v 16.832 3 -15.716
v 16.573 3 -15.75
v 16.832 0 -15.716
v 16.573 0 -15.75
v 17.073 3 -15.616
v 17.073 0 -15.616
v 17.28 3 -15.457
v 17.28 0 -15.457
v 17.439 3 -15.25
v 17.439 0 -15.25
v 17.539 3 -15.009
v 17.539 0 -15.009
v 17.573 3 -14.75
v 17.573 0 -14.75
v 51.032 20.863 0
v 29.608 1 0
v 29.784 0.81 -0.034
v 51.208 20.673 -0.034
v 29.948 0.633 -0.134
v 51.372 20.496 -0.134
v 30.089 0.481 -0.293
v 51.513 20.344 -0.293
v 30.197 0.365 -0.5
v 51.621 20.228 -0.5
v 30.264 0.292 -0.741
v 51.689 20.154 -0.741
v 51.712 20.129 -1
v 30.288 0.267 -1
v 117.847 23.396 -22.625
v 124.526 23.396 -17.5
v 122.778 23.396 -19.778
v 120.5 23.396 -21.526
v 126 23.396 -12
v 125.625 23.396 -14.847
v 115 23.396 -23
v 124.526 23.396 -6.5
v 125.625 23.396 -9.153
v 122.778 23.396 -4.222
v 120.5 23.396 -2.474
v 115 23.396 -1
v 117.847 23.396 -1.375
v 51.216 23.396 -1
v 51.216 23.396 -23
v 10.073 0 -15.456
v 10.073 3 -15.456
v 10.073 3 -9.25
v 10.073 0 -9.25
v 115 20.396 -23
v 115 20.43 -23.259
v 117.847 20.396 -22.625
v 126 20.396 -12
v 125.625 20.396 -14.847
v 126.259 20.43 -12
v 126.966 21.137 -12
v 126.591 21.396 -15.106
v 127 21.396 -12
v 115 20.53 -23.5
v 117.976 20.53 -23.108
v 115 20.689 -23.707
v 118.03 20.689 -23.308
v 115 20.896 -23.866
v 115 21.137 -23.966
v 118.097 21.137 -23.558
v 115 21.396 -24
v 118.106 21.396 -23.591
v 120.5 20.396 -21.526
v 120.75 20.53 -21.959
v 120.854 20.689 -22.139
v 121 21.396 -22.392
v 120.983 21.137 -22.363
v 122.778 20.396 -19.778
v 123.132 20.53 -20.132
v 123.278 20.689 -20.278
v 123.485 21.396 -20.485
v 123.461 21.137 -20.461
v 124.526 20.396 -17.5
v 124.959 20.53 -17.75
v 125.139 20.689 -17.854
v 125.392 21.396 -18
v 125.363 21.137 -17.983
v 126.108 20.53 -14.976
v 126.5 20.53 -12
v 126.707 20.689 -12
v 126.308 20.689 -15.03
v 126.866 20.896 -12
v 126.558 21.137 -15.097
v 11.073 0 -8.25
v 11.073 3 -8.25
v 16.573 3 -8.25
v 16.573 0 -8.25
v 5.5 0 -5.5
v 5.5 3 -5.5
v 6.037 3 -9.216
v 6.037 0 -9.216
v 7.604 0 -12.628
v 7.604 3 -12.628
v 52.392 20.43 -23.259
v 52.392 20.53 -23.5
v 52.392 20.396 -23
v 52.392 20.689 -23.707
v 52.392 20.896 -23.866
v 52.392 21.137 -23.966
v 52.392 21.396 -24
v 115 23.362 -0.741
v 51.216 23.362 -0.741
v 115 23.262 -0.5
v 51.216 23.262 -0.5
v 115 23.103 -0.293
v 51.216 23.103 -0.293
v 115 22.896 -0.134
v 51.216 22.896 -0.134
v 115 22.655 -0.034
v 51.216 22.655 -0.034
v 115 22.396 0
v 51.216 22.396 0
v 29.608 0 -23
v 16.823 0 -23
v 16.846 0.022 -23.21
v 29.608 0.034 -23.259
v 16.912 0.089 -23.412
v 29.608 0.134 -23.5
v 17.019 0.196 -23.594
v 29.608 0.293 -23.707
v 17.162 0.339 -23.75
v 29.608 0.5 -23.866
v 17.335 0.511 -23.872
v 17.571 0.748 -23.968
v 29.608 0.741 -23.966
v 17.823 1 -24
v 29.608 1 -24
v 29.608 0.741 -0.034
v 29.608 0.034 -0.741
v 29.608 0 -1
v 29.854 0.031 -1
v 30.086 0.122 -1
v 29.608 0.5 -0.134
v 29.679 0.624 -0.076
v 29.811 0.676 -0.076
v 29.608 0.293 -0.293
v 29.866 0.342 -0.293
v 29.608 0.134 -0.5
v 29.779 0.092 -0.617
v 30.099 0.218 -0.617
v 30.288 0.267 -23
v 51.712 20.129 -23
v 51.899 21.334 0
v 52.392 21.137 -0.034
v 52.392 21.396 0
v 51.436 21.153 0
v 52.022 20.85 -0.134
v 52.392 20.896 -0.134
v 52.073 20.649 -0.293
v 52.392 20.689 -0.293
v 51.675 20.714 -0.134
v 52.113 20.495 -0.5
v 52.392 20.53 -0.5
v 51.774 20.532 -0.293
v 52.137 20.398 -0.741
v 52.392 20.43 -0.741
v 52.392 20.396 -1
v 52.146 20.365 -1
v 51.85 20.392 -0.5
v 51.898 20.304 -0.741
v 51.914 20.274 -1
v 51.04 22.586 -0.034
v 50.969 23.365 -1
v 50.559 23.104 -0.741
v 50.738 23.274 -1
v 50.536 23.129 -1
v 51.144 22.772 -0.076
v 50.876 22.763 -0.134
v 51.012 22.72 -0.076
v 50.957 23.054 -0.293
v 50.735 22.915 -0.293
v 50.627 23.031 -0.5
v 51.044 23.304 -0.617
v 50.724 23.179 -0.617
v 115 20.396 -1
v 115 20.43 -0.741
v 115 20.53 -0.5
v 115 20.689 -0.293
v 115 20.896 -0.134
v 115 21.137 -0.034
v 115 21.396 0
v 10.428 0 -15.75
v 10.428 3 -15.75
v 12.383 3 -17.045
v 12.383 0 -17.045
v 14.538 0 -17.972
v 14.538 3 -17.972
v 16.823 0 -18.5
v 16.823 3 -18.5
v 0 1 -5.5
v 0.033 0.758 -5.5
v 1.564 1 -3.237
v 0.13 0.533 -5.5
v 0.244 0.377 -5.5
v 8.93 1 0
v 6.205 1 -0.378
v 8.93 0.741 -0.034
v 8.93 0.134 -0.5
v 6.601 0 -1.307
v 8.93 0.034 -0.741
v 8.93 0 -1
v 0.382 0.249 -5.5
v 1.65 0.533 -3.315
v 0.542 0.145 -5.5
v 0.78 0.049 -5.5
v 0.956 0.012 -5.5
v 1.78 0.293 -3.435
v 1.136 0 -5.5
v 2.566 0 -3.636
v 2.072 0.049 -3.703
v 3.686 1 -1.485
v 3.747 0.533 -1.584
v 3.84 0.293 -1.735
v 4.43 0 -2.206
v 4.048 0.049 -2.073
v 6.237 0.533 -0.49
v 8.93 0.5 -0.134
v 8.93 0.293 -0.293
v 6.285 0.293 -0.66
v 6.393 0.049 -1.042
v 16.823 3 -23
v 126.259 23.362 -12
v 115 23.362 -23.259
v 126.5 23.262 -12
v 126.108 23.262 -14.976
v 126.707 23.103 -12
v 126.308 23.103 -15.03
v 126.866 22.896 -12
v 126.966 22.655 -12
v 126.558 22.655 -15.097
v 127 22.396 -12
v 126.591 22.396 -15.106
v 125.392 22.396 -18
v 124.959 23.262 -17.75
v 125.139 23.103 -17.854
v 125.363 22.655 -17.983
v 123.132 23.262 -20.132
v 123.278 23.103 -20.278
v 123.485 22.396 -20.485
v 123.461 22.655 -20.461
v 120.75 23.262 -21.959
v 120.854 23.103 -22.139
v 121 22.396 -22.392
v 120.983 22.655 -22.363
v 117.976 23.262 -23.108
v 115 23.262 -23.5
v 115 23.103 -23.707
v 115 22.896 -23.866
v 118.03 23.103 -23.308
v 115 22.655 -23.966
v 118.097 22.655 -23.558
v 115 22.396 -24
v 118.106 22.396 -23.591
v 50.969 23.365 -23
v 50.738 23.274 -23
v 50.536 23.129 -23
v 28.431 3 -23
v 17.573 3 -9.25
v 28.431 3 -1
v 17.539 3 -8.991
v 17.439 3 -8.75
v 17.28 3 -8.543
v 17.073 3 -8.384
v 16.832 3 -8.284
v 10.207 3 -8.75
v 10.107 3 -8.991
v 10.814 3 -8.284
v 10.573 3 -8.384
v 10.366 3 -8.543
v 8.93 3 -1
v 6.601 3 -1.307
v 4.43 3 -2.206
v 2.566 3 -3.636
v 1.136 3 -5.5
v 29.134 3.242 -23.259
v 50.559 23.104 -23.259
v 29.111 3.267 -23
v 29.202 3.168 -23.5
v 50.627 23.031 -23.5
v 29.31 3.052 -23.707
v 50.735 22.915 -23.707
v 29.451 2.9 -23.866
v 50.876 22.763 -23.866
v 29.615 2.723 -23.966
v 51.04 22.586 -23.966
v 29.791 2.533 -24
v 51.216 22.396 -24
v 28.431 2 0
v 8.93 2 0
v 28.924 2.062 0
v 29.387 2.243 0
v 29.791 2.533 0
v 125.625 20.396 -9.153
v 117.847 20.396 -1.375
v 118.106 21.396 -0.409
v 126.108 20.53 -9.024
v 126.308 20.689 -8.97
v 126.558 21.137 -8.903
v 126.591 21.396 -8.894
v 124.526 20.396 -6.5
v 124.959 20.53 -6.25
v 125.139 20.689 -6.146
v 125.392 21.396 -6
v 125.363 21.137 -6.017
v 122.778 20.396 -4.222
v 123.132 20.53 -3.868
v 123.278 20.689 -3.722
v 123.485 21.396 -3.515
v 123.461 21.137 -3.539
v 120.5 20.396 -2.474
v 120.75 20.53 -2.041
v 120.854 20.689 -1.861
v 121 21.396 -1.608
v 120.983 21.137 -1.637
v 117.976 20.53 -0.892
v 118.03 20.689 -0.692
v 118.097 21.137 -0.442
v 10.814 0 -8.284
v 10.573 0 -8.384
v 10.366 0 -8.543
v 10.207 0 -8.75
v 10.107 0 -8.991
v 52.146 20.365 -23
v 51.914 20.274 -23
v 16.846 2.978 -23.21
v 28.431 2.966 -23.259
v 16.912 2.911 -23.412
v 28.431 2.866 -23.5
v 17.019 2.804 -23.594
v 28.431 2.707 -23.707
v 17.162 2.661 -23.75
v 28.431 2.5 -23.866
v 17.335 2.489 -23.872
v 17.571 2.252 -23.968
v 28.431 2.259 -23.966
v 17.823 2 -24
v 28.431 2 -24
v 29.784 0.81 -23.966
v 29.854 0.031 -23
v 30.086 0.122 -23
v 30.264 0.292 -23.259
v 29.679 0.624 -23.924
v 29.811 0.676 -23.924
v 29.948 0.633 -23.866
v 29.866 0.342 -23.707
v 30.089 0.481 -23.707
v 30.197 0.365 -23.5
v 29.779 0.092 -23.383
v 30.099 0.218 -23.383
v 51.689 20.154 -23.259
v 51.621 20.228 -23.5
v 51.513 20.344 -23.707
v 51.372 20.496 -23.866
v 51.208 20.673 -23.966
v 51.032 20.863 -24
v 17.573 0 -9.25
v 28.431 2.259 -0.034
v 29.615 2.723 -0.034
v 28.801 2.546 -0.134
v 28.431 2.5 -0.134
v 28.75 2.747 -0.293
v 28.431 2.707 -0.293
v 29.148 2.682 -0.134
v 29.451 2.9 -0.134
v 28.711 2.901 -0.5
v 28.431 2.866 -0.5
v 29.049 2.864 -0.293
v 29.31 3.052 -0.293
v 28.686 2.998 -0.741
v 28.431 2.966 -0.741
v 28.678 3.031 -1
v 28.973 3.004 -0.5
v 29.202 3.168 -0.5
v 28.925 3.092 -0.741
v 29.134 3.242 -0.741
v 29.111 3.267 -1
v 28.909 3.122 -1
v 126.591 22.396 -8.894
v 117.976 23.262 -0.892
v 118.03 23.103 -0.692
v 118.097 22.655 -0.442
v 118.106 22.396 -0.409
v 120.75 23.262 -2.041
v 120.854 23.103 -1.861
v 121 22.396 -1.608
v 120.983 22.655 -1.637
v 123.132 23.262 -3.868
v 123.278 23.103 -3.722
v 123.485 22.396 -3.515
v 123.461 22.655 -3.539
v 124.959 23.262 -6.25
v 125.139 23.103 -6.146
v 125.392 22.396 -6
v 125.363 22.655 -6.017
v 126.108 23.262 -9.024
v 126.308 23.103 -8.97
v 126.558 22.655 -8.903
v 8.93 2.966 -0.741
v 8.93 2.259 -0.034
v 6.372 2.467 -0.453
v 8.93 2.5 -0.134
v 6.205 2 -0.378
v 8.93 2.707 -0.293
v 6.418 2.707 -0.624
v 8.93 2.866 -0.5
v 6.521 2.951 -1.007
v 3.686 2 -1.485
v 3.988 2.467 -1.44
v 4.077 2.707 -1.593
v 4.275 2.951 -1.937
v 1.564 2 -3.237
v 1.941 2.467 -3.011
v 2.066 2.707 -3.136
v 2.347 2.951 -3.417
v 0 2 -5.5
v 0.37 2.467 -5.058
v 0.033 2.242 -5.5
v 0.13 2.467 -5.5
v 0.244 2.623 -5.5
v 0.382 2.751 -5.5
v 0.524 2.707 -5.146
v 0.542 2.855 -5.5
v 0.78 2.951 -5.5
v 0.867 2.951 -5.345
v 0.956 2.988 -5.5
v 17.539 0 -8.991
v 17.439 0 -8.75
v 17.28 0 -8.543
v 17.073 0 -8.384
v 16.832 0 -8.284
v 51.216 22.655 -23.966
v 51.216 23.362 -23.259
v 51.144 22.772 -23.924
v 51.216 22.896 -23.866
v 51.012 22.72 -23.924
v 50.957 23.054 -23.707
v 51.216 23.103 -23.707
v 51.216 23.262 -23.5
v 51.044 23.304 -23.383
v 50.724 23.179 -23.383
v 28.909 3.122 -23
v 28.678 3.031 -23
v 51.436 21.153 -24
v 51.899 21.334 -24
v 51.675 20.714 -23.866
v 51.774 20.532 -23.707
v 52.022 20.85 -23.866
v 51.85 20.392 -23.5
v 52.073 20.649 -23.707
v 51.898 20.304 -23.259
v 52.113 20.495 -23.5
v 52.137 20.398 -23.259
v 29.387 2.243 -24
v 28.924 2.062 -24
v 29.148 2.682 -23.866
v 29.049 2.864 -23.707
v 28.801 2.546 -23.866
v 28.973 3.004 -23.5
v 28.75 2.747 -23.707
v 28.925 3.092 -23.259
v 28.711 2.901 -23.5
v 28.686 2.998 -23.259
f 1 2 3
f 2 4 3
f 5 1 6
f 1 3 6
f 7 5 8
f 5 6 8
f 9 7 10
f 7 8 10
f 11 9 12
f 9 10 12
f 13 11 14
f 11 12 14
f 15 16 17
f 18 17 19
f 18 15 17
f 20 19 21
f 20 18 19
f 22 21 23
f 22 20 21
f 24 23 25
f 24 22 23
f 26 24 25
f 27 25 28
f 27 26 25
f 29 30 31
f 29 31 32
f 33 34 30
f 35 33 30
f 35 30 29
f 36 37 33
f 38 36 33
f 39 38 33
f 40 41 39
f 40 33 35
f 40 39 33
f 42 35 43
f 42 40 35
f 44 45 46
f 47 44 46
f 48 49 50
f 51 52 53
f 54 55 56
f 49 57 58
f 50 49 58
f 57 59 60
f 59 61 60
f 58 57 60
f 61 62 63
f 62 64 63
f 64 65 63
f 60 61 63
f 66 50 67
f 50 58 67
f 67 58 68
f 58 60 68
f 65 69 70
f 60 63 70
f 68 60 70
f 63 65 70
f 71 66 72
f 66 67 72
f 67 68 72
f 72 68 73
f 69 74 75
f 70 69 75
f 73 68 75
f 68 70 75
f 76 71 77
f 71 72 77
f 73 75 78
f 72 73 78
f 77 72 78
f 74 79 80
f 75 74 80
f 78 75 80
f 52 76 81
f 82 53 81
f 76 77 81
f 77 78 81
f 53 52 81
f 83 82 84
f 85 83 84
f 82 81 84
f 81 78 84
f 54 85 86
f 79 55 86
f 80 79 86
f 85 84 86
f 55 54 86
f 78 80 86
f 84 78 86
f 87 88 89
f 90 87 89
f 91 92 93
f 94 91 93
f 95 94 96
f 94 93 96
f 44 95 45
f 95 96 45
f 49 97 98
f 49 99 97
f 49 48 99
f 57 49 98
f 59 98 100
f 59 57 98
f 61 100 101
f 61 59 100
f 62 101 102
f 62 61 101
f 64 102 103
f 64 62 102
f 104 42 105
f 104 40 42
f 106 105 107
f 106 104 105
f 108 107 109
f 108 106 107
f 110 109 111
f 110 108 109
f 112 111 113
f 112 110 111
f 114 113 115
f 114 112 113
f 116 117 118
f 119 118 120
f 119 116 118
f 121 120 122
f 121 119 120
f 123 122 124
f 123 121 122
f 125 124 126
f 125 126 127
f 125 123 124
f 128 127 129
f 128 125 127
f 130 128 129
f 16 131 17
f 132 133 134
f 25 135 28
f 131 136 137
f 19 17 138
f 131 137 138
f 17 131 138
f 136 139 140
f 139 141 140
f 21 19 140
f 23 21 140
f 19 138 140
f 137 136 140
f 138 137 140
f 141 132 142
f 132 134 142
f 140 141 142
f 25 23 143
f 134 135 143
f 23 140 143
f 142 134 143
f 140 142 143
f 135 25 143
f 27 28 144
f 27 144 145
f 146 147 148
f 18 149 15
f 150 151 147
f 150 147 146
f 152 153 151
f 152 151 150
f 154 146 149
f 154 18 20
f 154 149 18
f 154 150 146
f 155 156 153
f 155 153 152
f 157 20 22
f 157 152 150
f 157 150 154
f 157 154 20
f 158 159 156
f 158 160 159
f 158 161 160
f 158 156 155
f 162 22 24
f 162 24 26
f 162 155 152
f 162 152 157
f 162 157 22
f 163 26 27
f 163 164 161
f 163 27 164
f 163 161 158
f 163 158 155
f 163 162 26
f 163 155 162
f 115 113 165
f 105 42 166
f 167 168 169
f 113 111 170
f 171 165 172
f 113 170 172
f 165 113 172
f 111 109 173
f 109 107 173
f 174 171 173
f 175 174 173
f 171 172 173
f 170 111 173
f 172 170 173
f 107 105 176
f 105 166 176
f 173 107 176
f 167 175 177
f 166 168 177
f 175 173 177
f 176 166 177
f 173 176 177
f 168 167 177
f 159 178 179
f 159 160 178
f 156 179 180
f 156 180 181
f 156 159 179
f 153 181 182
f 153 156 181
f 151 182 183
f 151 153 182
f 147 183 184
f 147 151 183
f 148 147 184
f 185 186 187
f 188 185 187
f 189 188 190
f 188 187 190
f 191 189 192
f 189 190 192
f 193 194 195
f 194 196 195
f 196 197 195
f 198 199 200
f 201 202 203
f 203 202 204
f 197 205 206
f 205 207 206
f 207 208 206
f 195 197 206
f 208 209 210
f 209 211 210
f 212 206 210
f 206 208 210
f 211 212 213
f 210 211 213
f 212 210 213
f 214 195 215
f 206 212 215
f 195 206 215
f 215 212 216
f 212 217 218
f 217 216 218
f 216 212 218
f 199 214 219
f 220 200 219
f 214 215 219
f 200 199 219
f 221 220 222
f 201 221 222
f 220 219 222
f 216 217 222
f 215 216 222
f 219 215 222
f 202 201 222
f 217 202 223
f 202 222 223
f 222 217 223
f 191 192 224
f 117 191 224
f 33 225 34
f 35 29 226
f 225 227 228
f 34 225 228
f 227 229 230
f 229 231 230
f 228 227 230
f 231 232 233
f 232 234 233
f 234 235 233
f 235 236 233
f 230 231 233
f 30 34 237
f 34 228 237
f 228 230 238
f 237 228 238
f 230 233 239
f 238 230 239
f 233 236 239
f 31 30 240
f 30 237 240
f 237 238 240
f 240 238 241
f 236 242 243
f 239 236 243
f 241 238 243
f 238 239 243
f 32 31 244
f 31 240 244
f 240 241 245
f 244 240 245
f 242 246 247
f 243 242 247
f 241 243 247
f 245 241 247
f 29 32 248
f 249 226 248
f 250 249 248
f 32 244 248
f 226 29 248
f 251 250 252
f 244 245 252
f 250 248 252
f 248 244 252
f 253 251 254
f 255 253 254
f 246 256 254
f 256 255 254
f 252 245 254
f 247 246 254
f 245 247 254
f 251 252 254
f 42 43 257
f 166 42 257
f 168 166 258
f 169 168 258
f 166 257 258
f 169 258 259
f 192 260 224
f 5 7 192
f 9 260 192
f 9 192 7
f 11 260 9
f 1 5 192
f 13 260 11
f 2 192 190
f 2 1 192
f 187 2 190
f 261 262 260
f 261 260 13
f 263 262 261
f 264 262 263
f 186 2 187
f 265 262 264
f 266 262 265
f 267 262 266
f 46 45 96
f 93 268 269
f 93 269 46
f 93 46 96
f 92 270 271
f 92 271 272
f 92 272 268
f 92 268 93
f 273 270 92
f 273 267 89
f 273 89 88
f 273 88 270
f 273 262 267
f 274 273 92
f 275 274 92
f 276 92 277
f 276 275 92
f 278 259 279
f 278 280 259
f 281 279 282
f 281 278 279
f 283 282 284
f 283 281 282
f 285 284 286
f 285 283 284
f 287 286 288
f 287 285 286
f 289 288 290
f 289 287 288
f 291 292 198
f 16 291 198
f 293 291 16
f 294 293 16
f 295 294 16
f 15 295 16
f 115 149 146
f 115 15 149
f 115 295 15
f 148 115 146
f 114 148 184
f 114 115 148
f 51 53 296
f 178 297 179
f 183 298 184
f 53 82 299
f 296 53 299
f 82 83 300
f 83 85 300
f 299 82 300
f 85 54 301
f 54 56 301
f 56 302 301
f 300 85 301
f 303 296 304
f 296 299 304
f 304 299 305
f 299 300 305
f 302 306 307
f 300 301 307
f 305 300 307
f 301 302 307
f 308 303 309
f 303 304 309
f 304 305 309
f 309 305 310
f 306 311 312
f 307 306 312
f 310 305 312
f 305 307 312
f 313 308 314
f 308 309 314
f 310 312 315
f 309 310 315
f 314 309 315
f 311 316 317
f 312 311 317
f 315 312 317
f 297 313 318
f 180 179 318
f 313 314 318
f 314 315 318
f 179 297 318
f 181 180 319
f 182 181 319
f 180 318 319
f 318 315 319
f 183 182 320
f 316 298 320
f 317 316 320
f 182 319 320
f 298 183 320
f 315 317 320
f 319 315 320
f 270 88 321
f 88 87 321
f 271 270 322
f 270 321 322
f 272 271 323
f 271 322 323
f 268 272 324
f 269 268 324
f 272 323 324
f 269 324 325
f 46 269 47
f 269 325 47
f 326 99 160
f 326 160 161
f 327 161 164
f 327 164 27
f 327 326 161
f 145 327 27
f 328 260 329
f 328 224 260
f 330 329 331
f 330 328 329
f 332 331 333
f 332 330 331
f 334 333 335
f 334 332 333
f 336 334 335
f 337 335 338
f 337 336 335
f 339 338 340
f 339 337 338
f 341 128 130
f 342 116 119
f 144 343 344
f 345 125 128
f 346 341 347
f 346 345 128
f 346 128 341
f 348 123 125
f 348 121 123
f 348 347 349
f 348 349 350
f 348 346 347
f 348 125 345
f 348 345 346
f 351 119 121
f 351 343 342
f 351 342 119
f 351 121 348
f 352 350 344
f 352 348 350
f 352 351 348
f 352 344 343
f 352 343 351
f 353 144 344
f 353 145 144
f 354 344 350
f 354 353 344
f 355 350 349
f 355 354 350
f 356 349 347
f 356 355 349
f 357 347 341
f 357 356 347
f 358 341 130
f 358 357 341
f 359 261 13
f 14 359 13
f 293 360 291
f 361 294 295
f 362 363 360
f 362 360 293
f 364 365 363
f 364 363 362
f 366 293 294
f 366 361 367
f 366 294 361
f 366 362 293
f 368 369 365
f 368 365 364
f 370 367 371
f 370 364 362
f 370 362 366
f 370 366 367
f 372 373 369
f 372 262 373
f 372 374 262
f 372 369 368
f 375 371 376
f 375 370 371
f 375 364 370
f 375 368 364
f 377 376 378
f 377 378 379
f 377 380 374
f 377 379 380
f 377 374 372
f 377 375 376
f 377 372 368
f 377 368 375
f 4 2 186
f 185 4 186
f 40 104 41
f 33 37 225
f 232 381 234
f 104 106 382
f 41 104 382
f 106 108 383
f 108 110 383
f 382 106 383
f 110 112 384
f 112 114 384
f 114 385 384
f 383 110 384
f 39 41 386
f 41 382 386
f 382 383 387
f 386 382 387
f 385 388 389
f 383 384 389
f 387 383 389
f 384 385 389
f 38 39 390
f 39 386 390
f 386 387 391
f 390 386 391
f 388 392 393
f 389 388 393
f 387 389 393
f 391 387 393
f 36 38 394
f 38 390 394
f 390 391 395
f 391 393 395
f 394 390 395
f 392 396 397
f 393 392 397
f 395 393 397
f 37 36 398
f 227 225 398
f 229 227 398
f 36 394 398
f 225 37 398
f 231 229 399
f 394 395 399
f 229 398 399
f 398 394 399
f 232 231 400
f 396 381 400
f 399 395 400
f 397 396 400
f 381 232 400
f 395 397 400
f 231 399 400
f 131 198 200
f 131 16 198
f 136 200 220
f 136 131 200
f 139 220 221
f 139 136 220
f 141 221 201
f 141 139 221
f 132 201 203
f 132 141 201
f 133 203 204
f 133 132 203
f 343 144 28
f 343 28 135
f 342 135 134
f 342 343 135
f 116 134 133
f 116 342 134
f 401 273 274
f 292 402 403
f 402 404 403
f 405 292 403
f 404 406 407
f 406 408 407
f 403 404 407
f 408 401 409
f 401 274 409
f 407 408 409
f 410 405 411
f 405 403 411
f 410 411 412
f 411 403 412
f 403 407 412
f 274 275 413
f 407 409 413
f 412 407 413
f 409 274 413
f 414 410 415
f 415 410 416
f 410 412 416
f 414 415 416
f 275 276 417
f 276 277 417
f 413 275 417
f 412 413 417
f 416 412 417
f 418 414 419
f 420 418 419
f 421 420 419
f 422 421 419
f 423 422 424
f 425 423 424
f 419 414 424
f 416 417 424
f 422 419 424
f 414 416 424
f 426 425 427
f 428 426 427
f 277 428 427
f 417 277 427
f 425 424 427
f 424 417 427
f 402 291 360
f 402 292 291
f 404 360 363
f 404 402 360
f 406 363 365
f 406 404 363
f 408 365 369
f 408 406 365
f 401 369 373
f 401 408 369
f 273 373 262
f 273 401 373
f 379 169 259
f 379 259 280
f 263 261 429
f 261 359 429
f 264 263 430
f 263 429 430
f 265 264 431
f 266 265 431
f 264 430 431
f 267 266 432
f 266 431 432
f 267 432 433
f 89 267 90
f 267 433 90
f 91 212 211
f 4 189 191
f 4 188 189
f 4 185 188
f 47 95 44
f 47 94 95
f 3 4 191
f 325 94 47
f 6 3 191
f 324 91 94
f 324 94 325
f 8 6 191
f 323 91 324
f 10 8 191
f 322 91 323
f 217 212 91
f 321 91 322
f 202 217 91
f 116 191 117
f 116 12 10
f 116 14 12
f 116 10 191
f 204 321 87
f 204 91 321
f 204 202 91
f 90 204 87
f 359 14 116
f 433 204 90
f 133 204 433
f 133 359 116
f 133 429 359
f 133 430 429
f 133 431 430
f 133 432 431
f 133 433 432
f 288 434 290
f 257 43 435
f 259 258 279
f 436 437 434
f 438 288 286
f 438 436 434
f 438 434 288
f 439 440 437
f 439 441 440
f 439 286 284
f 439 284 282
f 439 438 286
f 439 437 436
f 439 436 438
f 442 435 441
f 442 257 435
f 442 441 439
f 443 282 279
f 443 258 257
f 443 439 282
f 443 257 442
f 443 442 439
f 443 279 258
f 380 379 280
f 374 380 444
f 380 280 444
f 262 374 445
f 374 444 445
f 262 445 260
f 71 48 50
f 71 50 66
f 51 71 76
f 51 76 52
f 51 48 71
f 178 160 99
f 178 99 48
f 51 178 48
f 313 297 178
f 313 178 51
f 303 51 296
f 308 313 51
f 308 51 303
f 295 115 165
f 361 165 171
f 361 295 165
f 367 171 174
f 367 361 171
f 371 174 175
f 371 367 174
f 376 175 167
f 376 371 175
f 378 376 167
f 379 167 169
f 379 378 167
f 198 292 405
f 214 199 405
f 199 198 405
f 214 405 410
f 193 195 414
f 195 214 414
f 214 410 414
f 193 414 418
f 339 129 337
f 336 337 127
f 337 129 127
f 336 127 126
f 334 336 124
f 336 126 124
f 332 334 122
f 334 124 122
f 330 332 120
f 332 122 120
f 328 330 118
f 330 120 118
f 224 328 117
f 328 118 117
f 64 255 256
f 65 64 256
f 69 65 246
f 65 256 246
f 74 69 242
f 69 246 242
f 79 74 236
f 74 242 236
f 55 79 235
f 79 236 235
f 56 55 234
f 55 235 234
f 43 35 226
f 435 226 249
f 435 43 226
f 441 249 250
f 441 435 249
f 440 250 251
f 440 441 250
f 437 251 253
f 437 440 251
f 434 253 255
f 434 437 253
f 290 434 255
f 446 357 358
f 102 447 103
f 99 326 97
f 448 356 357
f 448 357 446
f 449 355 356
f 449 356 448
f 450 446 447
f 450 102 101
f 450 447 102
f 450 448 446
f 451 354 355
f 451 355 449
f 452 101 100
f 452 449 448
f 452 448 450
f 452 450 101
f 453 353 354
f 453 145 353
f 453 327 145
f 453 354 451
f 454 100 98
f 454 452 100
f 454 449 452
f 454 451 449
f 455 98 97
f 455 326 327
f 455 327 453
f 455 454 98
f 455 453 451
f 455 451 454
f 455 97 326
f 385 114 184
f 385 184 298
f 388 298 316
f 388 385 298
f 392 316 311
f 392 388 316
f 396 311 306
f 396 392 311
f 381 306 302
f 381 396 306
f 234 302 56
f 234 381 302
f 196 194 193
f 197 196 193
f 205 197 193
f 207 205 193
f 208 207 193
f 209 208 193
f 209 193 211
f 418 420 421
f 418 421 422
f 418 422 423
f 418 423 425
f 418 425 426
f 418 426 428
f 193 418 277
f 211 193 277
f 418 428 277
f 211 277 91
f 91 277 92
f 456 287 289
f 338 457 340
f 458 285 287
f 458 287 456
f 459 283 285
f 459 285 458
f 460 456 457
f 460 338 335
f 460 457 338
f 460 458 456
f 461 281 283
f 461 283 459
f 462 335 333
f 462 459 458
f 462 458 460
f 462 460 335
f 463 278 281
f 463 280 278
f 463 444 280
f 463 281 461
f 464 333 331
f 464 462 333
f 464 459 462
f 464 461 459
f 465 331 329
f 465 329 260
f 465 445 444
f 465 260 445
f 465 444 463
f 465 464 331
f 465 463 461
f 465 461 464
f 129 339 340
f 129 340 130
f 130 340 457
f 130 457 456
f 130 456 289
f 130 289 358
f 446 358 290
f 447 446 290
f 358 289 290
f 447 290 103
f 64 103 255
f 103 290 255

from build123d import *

# Parameters (mm, degrees)
EXTRUDE_THIN1_DEPTH = 24
CUT_EXTRUDE1_DEPTH  = 131.847239176
FILLET1_R           = 10
FILLET2_R           = 12
FILLET3_R           = 1
FILLET4_R           = 1


# Some blends are built 0.0001 mm under size
with BuildPart() as part:
    # Sketch1 → Extrude-Thin1 (new body)
    with BuildSketch(Plane.XY):
        Polygon((0, 0), (30, 0), (52, 20.396078054), (127, 20.396078054), (127, 23.396078054), (50.823303189, 23.396078054), (28.823303189, 3), (0, 3), align=None)
    extrude(amount=-EXTRUDE_THIN1_DEPTH)

    # Sketch2 → Cut-Extrude1 (cut, through all)
    with BuildSketch(Plane(origin=(0, 3, 0), x_dir=(1, 0, 0), z_dir=(0, 1, 0))):
        with BuildLine():
            Line((16.823303189, 24), (0, 24))
            Line((0, 24), (0, 5.5))
            Line((0, 5.5), (5.5, 5.5))
            ThreePointArc((5.5, 5.5), (6.698004209, 10.97816866), (10.073303189, 15.456215417))
            Line((10.073303189, 15.456215417), (10.073303189, 8.25))
            Line((10.073303189, 8.25), (17.573303189, 8.25))
            Line((17.573303189, 8.25), (17.573303189, 15.75))
            Line((17.573303189, 15.75), (10.427766753, 15.75))
            ThreePointArc((10.427766753, 15.75), (13.439867838, 17.556796696), (16.823303189, 18.5))
            Line((16.823303189, 18.5), (16.823303189, 24))
        make_face()
    extrude(amount=-CUT_EXTRUDE1_DEPTH, mode=Mode.SUBTRACT)

    # Fillet1
    # the kernel refuses this fillet: 10 mm, written as the material it takes off along each edge
    with BuildSketch(Plane(origin=(0, 25.325713874, 0), x_dir=(1, 0, 0), z_dir=(0, -1, 0))) as fillet1_piece_1:
        with BuildLine():
            CenterArc((8.93028555, -10), FILLET1_R, 90, 63.25631605)
            Line((0, -5.5), (-0.178605711, -5.41))
            ThreePointArc((-0.178605711, -5.41), (-0.2, -2.75), (-0.2, 0))
            Line((-0.2, 0), (0, 0.2))
            Line((0, 0.2), (8.93028555, 0.2))
            Line((8.93028555, 0.2), (8.93028555, 0))
        make_face()
    extrude(amount=47.651427749, mode=Mode.SUBTRACT)

    # Fillet2
    fillet2_edges = [part.edges().sort_by_distance(p)[0] for p in [
        (127, 21.896078054, 0),
        (127, 21.896078054, -24),
    ]]
    fillet(fillet2_edges, radius=FILLET2_R - 0.0001)  # a hair under: the kernel refuses the full size

    # Fillet3
    fillet3_edges = [part.edges().sort_by_distance(p)[0] for p in [
        (52, 20.396078054, -12),
        (30, 0, -12),
        (28.823303189, 3, -12),
        (50.823303189, 23.396078054, -12),
        (82.911701595, 23.396078054, -24),
        (39.823303189, 13.198039027, -24),
        (23.411651595, 0, -24),
        (22.823303189, 3, -24),
        (16.823303189, 1.5, -24),
        (41, 10.198039027, -24),
        (83.50005, 20.396078054, -24),
        (18.876794369, 3, 0),
        (3.686241309, 3, -1.485306817),
        (19.465142775, 0, 0),
        (3.686241309, 0, -1.485306817),
        (123.485310664, 20.396078054, -20.485310664),
        (123.485310664, 20.396078054, -3.514689336),
        (123.485310664, 23.396078054, -20.485310664),
        (123.485310664, 23.396078054, -3.514689336),
        (41, 10.198039027, 0),
        (39.823303189, 13.198039027, 0),
        (82.911701595, 23.396078054, 0),
        (83.50005, 20.396078054, 0),
    ]]
    fillet(fillet3_edges, radius=FILLET3_R)

    # Fillet4
    fillet4_edges = [part.edges().sort_by_distance(p)[0] for p in [
        (17.573303189, 1.5, -15.75),
        (17.573303189, 1.5, -8.25),
        (10.073303189, 1.5, -8.25),
    ]]
    fillet(fillet4_edges, radius=FILLET4_R)


solid = part.part
